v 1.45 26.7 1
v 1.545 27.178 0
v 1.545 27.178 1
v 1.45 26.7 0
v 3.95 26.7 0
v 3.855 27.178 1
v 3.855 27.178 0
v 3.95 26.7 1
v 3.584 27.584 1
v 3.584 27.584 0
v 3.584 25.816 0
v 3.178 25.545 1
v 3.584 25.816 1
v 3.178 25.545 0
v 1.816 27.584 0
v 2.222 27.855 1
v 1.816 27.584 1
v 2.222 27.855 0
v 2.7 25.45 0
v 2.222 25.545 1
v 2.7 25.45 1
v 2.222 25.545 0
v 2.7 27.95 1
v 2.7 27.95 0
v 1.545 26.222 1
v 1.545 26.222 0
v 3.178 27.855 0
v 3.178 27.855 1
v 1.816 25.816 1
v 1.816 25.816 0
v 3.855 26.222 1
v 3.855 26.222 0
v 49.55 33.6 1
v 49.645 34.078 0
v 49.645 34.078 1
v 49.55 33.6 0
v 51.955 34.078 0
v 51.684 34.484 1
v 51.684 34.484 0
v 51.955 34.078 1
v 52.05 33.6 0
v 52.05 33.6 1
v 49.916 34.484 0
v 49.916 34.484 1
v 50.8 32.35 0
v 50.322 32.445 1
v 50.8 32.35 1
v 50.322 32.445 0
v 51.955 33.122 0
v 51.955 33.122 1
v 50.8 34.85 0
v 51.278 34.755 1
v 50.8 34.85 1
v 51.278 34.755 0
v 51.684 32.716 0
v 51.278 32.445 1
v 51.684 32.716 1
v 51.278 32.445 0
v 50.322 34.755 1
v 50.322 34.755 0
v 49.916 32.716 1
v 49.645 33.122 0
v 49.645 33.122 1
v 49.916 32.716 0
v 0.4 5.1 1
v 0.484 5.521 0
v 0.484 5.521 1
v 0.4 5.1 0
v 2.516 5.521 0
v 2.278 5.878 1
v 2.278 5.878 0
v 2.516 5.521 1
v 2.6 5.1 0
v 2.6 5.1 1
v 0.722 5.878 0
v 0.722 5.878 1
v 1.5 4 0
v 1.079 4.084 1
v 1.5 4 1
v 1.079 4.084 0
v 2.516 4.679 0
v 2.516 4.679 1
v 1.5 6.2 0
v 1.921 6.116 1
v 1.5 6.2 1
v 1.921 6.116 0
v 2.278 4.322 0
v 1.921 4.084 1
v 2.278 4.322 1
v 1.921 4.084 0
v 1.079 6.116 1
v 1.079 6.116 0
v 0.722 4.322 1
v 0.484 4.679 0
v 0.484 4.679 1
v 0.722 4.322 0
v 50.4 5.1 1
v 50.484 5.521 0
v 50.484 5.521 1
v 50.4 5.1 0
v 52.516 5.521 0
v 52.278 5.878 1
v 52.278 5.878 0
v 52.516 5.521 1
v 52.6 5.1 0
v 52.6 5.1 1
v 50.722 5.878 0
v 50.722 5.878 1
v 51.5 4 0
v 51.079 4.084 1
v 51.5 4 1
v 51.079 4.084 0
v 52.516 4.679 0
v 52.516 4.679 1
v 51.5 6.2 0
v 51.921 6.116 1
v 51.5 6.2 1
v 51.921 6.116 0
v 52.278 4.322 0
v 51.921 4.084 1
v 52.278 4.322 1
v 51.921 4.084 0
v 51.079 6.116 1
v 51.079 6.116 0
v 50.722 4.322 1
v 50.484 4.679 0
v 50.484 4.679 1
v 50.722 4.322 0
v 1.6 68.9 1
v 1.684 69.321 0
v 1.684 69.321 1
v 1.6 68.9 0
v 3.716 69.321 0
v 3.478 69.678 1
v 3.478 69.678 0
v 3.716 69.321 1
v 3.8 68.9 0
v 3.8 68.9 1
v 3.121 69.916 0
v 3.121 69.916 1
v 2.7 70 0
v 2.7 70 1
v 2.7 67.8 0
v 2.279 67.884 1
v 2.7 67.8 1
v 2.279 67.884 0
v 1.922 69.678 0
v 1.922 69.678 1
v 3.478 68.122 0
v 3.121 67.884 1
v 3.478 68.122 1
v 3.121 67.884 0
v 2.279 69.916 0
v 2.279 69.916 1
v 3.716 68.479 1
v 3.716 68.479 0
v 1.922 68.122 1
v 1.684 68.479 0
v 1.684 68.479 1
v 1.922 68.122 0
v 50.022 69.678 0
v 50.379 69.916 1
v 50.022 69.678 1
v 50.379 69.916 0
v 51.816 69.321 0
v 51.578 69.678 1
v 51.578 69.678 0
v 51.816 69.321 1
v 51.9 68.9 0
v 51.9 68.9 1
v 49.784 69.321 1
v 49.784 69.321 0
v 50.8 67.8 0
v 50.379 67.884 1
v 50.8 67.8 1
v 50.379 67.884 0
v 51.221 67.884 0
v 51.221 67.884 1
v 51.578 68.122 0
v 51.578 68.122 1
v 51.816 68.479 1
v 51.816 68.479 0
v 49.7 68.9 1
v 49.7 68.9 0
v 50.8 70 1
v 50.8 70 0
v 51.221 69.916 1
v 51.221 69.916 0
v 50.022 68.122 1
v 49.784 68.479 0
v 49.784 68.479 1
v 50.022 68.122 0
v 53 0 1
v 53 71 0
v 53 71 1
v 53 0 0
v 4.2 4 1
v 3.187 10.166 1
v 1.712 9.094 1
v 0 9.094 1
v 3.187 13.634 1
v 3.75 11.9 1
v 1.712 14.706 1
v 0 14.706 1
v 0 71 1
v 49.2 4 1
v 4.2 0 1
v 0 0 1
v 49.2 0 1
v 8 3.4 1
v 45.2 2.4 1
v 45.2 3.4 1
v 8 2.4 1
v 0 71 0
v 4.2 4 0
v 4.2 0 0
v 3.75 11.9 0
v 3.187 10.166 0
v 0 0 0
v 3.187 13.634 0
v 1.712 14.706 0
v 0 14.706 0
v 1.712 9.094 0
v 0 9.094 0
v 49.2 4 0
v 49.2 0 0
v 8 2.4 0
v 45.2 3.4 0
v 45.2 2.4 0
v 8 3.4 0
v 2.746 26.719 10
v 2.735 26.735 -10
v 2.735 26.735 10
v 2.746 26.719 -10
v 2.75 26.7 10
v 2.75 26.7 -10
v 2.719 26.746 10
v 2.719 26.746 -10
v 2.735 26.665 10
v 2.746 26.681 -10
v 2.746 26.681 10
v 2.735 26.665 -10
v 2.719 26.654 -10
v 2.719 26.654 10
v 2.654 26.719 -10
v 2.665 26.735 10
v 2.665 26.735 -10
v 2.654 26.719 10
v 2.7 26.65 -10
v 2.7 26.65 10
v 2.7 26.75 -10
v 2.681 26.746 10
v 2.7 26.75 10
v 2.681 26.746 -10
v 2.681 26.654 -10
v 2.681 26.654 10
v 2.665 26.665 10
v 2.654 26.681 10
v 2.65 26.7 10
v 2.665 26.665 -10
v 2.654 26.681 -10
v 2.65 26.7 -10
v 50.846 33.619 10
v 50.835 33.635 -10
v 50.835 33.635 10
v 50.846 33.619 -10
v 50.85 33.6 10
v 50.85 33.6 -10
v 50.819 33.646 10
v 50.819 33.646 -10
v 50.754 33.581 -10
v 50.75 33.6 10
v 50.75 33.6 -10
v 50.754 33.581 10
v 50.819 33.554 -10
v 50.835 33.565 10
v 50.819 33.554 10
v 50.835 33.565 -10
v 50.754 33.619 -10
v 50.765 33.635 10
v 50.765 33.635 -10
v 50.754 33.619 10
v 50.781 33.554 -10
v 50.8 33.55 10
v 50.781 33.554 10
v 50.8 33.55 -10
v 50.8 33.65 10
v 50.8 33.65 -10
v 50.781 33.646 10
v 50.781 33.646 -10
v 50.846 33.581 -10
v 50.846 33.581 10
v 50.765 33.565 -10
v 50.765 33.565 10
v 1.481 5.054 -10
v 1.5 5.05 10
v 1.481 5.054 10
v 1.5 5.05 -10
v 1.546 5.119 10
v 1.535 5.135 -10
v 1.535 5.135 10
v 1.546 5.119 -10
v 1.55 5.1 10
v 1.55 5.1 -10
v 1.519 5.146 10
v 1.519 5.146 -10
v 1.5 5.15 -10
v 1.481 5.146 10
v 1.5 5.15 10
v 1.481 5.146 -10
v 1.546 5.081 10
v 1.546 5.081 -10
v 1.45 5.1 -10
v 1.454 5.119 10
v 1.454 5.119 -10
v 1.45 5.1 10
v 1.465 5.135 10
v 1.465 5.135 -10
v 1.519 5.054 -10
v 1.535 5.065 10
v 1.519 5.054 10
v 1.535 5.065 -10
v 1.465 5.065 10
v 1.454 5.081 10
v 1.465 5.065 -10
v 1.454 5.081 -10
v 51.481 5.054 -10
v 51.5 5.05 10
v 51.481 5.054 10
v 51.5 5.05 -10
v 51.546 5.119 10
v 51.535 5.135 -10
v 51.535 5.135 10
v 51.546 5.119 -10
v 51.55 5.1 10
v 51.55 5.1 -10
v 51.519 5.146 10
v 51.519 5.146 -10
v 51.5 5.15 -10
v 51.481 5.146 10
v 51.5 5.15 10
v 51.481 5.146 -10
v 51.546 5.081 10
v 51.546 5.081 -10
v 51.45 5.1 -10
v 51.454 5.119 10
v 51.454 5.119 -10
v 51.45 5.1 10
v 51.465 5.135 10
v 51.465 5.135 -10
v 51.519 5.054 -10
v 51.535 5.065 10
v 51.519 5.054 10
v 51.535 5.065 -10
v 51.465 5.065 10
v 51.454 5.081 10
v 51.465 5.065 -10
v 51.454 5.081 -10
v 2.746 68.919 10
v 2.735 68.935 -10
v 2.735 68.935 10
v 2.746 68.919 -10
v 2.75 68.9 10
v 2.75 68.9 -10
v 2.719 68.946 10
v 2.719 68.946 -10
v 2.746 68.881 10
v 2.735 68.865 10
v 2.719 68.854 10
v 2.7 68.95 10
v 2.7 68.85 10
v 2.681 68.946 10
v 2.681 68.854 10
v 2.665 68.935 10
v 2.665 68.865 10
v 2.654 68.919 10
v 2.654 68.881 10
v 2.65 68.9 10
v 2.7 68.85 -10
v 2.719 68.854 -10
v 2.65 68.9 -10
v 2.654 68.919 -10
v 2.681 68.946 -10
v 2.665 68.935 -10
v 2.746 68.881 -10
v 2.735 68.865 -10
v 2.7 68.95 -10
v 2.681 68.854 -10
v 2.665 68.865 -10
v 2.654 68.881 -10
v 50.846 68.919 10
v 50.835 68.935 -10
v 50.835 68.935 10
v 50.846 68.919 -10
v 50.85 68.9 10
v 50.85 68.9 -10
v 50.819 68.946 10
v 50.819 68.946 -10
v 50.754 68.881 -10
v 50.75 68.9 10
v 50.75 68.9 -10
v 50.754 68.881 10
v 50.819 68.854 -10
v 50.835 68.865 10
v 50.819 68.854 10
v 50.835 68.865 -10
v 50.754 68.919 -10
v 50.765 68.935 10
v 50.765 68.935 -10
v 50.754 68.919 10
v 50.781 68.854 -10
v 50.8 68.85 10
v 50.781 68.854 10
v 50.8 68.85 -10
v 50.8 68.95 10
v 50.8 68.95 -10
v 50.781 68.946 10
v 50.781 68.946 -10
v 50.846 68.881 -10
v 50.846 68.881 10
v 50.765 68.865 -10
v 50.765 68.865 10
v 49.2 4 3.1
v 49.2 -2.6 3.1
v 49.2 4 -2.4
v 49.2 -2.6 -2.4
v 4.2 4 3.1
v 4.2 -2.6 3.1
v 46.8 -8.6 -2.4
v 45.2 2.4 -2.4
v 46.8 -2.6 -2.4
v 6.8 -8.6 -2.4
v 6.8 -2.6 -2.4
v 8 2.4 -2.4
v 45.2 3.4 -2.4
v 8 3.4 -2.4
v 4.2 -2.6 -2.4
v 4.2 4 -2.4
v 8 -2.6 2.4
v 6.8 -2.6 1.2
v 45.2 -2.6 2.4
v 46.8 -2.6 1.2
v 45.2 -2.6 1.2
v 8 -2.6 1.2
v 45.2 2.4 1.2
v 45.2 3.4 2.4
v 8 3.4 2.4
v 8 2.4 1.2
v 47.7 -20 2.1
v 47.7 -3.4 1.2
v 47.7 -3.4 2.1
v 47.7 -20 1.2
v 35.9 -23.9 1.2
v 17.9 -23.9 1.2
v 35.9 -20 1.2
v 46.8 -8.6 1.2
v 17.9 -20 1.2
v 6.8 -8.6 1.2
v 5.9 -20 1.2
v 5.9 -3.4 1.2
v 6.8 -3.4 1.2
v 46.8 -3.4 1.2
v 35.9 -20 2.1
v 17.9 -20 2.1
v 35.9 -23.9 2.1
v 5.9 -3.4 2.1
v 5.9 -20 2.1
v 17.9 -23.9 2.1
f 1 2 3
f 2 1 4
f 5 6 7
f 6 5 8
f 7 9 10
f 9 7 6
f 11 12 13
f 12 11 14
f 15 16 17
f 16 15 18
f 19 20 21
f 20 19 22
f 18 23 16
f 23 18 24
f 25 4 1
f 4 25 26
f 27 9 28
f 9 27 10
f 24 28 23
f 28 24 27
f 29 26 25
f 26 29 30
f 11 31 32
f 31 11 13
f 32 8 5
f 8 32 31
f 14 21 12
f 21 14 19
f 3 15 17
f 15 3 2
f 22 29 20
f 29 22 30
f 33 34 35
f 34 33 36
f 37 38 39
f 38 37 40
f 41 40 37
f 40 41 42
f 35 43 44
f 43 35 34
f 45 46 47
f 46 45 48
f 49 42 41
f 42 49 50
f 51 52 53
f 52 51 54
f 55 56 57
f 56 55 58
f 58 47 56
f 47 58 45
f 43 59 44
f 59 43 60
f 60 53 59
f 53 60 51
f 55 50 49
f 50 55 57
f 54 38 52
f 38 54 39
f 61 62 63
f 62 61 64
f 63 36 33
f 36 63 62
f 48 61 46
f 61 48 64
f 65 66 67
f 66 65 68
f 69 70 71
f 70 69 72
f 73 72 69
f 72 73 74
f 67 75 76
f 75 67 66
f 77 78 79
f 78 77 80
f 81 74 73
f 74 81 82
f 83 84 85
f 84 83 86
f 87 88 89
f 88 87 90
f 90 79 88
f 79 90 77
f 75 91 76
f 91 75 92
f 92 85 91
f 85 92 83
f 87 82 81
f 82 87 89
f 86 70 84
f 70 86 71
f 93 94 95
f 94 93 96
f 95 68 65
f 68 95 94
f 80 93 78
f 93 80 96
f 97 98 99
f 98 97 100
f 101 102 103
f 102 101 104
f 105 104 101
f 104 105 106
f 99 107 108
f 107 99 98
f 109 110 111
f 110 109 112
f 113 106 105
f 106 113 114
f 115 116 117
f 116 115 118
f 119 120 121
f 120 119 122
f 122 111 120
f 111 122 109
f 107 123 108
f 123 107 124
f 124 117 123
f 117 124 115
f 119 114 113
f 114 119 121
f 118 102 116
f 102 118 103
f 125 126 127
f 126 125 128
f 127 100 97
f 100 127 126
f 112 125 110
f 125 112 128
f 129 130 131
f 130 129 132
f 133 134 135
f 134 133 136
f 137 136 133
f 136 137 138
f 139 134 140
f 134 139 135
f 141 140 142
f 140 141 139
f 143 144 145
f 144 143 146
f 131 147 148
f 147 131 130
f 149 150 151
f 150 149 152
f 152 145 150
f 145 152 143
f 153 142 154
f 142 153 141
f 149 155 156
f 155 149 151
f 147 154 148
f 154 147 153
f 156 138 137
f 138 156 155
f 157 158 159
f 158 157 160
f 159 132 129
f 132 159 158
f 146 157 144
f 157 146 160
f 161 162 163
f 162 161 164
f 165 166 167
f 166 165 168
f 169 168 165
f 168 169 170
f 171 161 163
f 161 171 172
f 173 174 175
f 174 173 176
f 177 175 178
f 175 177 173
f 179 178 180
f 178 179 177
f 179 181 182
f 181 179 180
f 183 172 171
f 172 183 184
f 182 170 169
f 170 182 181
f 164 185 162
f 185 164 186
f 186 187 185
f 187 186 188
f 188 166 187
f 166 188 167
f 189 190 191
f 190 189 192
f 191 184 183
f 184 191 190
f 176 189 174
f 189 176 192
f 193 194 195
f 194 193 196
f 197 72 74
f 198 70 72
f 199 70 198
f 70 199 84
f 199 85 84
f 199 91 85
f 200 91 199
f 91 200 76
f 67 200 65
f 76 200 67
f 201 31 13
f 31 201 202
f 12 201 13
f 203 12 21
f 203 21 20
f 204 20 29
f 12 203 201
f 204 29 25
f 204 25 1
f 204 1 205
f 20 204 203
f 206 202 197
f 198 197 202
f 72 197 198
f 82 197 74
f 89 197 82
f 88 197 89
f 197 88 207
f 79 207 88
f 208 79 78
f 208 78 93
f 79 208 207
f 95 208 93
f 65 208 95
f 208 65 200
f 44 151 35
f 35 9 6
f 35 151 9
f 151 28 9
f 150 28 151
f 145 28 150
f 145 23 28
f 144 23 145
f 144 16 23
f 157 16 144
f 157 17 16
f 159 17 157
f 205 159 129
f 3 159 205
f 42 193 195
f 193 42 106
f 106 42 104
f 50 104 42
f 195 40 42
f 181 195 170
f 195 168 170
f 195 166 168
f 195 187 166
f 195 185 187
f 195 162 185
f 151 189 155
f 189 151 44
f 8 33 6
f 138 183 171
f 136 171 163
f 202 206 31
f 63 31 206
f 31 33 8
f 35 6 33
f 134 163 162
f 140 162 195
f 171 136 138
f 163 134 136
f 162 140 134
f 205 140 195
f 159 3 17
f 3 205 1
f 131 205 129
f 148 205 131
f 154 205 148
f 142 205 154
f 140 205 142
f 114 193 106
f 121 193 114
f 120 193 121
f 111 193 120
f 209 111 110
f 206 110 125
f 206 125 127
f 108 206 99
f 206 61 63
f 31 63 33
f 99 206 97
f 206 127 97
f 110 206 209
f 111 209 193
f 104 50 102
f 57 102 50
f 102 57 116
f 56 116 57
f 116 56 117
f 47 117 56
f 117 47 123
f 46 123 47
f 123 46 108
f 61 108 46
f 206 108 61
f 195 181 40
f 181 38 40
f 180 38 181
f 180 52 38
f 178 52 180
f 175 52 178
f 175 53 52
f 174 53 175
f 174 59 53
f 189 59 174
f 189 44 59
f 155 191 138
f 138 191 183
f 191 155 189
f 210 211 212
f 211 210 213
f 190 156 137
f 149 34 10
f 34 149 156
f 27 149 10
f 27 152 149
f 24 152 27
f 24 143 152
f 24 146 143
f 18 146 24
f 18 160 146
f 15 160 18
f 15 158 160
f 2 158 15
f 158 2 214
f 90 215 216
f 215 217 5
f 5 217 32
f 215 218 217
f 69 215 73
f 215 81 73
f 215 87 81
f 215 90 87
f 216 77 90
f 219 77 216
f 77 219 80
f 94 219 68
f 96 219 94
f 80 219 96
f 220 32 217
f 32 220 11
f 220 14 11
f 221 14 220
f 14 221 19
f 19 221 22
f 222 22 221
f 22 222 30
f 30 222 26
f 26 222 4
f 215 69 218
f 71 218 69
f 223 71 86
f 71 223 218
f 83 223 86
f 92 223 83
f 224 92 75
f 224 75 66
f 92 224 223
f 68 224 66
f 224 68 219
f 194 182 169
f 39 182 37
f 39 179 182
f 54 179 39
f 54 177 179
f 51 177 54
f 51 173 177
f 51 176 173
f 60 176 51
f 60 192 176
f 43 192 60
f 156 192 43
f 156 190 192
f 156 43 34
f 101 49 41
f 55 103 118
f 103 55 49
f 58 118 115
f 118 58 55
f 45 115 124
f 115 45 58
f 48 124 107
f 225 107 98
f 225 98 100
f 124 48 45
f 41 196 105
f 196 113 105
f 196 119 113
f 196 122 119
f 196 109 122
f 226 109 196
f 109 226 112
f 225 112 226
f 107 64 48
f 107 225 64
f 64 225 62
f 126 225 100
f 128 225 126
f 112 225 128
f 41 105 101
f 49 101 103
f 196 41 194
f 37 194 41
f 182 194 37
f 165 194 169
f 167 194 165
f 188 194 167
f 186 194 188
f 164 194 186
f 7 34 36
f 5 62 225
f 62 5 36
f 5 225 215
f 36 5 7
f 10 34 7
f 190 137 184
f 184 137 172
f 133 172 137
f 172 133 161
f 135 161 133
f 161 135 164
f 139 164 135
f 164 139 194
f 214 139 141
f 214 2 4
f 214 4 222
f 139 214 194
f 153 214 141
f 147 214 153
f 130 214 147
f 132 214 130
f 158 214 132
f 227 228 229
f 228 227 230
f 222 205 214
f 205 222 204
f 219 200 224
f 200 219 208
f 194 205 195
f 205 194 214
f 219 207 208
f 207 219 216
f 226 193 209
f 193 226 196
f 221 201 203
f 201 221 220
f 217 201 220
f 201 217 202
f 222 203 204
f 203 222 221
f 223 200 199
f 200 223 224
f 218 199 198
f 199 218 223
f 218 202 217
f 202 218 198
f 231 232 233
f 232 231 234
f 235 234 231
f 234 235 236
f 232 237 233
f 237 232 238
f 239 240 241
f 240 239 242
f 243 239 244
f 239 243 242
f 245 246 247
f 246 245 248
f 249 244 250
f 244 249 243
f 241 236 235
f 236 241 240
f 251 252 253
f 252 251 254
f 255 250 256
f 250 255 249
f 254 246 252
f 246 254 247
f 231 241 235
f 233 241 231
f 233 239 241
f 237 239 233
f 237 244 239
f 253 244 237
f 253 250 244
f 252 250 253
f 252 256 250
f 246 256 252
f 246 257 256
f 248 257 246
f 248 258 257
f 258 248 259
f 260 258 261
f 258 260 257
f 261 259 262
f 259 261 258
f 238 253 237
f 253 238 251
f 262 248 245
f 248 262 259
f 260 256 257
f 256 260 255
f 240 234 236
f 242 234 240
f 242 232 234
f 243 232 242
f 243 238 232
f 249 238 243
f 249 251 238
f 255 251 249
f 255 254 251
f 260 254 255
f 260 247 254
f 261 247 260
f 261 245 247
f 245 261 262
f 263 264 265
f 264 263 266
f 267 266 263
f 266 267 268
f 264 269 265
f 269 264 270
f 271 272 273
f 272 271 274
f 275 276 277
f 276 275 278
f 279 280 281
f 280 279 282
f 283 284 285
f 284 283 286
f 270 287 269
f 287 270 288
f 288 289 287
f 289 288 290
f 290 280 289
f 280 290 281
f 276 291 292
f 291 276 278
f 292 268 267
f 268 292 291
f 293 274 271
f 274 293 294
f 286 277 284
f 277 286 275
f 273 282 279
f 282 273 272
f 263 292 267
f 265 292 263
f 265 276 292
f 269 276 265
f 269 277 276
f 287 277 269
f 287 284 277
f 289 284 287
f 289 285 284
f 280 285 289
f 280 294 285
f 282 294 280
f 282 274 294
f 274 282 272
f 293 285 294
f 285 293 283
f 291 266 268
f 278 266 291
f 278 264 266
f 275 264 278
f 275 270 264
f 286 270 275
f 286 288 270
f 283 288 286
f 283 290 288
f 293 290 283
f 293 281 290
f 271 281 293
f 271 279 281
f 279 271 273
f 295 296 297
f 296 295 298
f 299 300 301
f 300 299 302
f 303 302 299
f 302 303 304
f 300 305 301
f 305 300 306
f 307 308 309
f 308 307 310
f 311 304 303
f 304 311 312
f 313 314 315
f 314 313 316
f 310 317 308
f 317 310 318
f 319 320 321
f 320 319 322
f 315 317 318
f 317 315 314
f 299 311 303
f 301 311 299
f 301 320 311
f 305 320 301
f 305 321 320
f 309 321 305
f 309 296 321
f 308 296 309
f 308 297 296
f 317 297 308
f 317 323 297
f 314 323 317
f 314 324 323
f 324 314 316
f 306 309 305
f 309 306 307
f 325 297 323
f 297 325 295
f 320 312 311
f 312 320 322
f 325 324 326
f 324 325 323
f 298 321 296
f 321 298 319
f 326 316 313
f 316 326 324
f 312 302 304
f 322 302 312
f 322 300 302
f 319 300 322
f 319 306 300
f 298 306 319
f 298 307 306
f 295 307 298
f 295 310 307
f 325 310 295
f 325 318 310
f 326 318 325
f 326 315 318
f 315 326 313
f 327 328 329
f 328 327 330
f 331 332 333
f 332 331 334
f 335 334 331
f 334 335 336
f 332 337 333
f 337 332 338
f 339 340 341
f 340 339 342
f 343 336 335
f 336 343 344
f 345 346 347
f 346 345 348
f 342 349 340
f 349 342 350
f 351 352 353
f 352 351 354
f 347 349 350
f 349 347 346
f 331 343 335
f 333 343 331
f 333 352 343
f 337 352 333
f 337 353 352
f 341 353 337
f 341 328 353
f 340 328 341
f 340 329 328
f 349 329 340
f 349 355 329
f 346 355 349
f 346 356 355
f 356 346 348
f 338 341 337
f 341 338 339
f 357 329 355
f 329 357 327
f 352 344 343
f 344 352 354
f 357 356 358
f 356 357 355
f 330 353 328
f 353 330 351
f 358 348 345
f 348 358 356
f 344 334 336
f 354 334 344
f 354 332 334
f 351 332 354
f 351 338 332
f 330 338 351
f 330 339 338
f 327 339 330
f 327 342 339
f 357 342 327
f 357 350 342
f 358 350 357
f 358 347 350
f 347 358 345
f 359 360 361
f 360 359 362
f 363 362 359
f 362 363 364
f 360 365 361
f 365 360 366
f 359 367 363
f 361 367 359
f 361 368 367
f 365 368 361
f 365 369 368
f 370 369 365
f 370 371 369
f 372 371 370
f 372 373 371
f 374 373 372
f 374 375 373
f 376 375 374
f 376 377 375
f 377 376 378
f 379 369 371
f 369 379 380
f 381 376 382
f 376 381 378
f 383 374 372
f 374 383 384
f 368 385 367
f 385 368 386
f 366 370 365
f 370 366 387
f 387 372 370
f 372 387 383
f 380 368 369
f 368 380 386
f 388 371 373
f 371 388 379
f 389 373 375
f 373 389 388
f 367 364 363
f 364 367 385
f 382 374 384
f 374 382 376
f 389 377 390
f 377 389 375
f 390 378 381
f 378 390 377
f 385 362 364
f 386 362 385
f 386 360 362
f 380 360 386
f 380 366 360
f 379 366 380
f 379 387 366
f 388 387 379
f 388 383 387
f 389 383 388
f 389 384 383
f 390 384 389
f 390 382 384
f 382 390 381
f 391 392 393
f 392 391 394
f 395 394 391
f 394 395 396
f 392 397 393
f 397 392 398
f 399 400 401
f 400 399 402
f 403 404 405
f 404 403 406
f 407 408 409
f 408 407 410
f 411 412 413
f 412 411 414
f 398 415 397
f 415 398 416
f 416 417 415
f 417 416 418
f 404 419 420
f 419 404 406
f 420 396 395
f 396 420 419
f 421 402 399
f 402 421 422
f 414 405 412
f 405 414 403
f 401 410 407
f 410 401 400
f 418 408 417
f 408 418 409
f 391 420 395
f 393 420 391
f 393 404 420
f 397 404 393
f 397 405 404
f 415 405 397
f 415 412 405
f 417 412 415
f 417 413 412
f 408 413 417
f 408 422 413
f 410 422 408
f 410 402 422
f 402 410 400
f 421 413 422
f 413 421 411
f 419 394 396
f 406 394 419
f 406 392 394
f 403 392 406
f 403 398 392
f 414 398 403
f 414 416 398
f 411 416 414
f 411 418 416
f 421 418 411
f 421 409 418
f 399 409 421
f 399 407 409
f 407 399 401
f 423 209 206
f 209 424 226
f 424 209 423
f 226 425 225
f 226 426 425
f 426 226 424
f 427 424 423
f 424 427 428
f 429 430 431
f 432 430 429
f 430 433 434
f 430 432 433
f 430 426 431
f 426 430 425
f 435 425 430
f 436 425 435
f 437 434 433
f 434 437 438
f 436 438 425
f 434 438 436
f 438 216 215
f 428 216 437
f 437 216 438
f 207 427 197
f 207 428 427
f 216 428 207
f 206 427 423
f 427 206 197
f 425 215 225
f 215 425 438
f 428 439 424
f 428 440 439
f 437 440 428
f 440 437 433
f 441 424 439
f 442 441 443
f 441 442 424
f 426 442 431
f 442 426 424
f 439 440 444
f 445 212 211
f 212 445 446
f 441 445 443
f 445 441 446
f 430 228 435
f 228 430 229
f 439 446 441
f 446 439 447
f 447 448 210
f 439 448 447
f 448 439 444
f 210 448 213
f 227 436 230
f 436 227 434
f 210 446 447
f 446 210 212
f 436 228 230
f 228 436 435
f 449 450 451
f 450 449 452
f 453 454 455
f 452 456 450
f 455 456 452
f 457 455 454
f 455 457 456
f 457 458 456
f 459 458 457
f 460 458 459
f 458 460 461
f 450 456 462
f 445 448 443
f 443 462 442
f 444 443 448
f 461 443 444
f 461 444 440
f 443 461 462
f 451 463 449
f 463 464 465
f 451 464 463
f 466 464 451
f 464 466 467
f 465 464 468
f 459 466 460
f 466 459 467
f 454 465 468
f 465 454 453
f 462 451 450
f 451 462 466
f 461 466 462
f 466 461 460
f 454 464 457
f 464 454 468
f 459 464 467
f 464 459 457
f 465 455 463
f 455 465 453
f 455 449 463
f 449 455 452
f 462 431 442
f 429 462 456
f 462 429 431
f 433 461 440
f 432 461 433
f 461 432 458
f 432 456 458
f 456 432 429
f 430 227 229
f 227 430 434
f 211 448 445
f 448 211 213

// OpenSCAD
// file: ssd.scad
module ssd_sata_usb() {
  translate([0.9,-5.8,0.9]) color("dodgerblue") cube([40,11,3.6]);
  difference() {
    color("#404040") cube([41.8,20.5,0.9]);
    translate([-1,16.6,-1]) cube([13,5,5]);
    translate([30,16.6,-1]) cube([13,5,5]);
  }
}

//ssd_sata_usb();
module ssd_drill(guide=false) {
  $fn=16;
  module drill(d) {
    translate([4,14.3,4.5-10]) cylinder(d=d,h=10);
    translate([66,14.3,4.5-10]) cylinder(d=d,h=10);
    translate([4,90.6,4.5-10]) cylinder(d=d,h=10);
    translate([66,90.6,4.5-10]) cylinder(d=d,h=10);
    
    translate([4.5,14.3,3]) rotate([0,-90,0]) cylinder(d=d,h=10);
    translate([4.5,90.6,3]) rotate([0,-90,0]) cylinder(d=d,h=10);
    translate([70-4.5,14.3,3]) rotate([0,90,0]) cylinder(d=d,h=10);
    translate([70-4.5,90.6,3]) rotate([0,90,0]) cylinder(d=d,h=10);
  }
  color("Gainsboro") if(guide==true) drill(0.1); else drill(3); 
  
}

module ssd(guide=false,usb=false) {
  difference() {
    color("#303030") cube([70,100,7]);
    translate([11.5,-1,-1]) cube([37.2,6,7.2]);
    ssd_drill();
  }
  if (usb==true) translate([9,0,4.7]) rotate([180,0,0])ssd_sata_usb();
  if (guide==true) ssd_drill(guide=true);
}


module ssd_pack(n,guide=false,usb=false) {
  for (i = [0:n-1])
    translate([0,0,i*9]) ssd(guide=guide,usb=usb);
}

ssd_pack(n=1,guide=true,usb=true);
// main file
use <ssd.scad>

module samsungSSD_drill(guide=false) {
  $fn=16;
  module drill_screw(d) {
    translate([2.7,26.7,0])
      cylinder(h=20,d=d, center=true);
    translate([50.8,33.6,0])
      cylinder(h=20,d=d,center=true);
  }
  module drill_positionnal(d) {
    translate([1.5,5.1,0])
      cylinder(h=20,d=d,center=true);
    translate([51.5,5.1,0])
      cylinder(h=20,d=d,center=true);
    translate([2.7,68.9,0])
      cylinder(h=20,d=d,center=true);
    translate([50.8,68.9,0])
      cylinder(h=20,d=d,center=true);
  }
  if(guide==true) drill_screw(0.1); else drill_screw(2.5);
  if(guide==true) drill_positionnal(0.1); else drill_positionnal(2.2);
}

module samsungSSD_sata () {
  difference() {
    cube([45,6.6,5.5]);
    translate([3.8,-1,-1]) cube([37.2,7,5.8]);
  }
}

module samsungSSD_board(guide=false) {
  difference() {
    color("green") cube([53,71,1]);
    samsungSSD_drill();
    translate([0.8,11.9,0]) cylinder(h=4,d=5.9,center=true);
  }
  if (guide==true) samsungSSD_drill(guide=true);
  translate([4.2,-2.6,-2.4]) samsungSSD_sata ();
  translate([5.9,-3.4,2.1]) rotate([180,0,0]) ssd_sata_usb();
}

samsungSSD_board(guide=true);
